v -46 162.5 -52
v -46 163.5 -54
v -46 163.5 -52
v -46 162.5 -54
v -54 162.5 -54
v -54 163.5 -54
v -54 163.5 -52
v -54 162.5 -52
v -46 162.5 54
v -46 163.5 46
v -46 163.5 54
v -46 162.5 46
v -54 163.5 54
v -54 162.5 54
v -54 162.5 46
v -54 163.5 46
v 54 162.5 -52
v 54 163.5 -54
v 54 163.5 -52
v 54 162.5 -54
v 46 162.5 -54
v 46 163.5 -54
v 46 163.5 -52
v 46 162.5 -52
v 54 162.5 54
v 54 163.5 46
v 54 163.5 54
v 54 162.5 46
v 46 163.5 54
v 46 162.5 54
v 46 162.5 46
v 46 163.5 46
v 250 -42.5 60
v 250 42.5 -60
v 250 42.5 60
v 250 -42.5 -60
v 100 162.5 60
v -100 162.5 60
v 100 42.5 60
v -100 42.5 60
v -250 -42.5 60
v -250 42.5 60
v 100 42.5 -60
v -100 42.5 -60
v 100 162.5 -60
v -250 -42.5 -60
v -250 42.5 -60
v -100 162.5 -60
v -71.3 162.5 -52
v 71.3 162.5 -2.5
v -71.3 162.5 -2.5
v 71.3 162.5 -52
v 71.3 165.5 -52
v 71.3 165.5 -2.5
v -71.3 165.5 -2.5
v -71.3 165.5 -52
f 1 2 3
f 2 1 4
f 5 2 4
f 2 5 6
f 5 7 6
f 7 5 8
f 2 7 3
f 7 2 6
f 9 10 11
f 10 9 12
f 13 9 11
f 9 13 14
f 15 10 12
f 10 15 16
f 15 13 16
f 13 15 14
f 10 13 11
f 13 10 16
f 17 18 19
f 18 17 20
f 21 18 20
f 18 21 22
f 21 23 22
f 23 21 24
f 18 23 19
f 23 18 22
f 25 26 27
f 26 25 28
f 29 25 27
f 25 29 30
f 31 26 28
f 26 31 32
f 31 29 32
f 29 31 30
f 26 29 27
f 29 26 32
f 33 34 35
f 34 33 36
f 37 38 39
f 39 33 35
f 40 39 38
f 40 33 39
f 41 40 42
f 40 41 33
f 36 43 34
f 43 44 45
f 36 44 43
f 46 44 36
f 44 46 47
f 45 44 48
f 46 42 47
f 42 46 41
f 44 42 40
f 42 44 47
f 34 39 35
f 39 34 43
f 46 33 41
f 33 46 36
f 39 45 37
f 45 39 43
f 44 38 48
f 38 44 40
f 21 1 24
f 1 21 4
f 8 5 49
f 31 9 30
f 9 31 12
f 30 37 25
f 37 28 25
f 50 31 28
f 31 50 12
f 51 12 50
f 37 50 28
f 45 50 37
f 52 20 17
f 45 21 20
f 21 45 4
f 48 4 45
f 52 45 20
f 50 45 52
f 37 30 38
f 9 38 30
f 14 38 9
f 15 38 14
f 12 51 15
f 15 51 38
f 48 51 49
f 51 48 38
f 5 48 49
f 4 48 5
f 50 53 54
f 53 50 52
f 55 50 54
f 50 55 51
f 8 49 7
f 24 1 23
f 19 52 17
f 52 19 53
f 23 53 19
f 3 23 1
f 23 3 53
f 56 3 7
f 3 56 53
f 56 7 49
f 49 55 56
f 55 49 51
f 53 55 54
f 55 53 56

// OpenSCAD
// LUME T-form concept — bar + rear pod
// 2026-04-26 — proposal: separate compute pod behind the bar so the bar keeps
// its slim Sonos profile and the K11 + Mega + cables get a proper volume.
//
// Render: openscad -o lume-pod-concept.stl lume-pod-concept.scad
// Or load in OpenSCAD GUI for live preview.

include <lume-config.scad>;

// --- Pod parameters (all editable here) ---
POD_W       = 200;   // pod width along bar X-axis
POD_H       = LUME_HEIGHT;  // match bar height for a clean side silhouette
POD_D       = 120;   // pod depth along bar Y-axis (extension behind bar)
POD_X_OFF   = 0;     // 0 = centered, negative = shift left
POD_VESA_PITCH = 100;  // VESA 100×100 on back of pod

// Whether to fillet the pod-bar transition for visual continuity.
POD_FILLET  = true;
POD_FILLET_R = 12;

// --- Front bar (current LUME shell) ---
module front_bar() {
    // Use a simple cube proxy — real bar is the existing shell halves
    color("#222831", 0.9)
    translate([-LUME_WIDTH/2, -LUME_DEPTH/2, -LUME_HEIGHT/2])
        cube([LUME_WIDTH, LUME_DEPTH, LUME_HEIGHT]);
}

// --- Rear pod (new compute enclosure) ---
module rear_pod() {
    color("#1a2027", 0.95)
    translate([POD_X_OFF - POD_W/2, LUME_DEPTH/2, -POD_H/2])
        cube([POD_W, POD_D, POD_H]);
}

// Optional fillet between bar back face and pod front face — gives the
// transition a soft chamfer instead of a hard 90° step.
module fillet_strip() {
    if (POD_FILLET) {
        color("#3a4252", 0.85)
        translate([POD_X_OFF - POD_W/2, LUME_DEPTH/2 - POD_FILLET_R/2,
                   -POD_H/2])
            // Triangular chamfer prism running the pod width.
            rotate([0, 0, 0])
                linear_extrude(height=POD_H)
                    polygon(points=[[0, 0],
                                    [POD_W, 0],
                                    [POD_W, POD_FILLET_R],
                                    [0, POD_FILLET_R]]);
    }
}

// --- Internal callouts (visualisation) ---
module k11_proxy() {
    // K11 published spec: 142.6 × 113 × 49.5mm — landscape flat
    K11_W = 142.6; K11_D = 113; K11_H = 49.5;
    color("#5a8a5a", 0.85)
    translate([POD_X_OFF - K11_W/2,
               LUME_DEPTH/2 + 10,                  // 10mm clearance from bar back
               -POD_H/2 + 8])                      // 8mm off pod floor for airflow
        cube([K11_W, K11_D, K11_H]);
}

module femto_proxy() {
    // Femto Mega: 127×65×38 with rear Jetson hump (extra 25mm in -Y direction)
    // Mounted in FRONT half of bar; hump extends back into pod.
    FM_W = 127; FM_D = 65; FM_H = 38;
    HUMP_D = 25;
    color("#a08020", 0.9)
    union() {
        // Main body in front bar
        translate([-FM_W/2, -LUME_DEPTH/2 + 3, -FM_H/2])
            cube([FM_W, FM_D, FM_H]);
        // Rear Jetson hump extending into pod
        translate([-FM_W/2 + 20, FM_D/2 - LUME_DEPTH/2 + 3, -FM_H/2 + 10])
            cube([FM_W - 40, HUMP_D, FM_H - 20]);
    }
}

module vesa_pad() {
    // VESA 100×100 mount pads on REAR face of pod (against wall)
    color("#888", 0.9)
    for (x = [-POD_VESA_PITCH/2, POD_VESA_PITCH/2],
         z = [-POD_VESA_PITCH/2, POD_VESA_PITCH/2]) {
        translate([POD_X_OFF + x - 4, LUME_DEPTH/2 + POD_D - 1, z - 4])
            cube([8, 2, 8]);
    }
}

// --- Assembly ---
module lume_t_form() {
    front_bar();
    rear_pod();
    fillet_strip();
    k11_proxy();
    femto_proxy();
    vesa_pad();
}

lume_t_form();
